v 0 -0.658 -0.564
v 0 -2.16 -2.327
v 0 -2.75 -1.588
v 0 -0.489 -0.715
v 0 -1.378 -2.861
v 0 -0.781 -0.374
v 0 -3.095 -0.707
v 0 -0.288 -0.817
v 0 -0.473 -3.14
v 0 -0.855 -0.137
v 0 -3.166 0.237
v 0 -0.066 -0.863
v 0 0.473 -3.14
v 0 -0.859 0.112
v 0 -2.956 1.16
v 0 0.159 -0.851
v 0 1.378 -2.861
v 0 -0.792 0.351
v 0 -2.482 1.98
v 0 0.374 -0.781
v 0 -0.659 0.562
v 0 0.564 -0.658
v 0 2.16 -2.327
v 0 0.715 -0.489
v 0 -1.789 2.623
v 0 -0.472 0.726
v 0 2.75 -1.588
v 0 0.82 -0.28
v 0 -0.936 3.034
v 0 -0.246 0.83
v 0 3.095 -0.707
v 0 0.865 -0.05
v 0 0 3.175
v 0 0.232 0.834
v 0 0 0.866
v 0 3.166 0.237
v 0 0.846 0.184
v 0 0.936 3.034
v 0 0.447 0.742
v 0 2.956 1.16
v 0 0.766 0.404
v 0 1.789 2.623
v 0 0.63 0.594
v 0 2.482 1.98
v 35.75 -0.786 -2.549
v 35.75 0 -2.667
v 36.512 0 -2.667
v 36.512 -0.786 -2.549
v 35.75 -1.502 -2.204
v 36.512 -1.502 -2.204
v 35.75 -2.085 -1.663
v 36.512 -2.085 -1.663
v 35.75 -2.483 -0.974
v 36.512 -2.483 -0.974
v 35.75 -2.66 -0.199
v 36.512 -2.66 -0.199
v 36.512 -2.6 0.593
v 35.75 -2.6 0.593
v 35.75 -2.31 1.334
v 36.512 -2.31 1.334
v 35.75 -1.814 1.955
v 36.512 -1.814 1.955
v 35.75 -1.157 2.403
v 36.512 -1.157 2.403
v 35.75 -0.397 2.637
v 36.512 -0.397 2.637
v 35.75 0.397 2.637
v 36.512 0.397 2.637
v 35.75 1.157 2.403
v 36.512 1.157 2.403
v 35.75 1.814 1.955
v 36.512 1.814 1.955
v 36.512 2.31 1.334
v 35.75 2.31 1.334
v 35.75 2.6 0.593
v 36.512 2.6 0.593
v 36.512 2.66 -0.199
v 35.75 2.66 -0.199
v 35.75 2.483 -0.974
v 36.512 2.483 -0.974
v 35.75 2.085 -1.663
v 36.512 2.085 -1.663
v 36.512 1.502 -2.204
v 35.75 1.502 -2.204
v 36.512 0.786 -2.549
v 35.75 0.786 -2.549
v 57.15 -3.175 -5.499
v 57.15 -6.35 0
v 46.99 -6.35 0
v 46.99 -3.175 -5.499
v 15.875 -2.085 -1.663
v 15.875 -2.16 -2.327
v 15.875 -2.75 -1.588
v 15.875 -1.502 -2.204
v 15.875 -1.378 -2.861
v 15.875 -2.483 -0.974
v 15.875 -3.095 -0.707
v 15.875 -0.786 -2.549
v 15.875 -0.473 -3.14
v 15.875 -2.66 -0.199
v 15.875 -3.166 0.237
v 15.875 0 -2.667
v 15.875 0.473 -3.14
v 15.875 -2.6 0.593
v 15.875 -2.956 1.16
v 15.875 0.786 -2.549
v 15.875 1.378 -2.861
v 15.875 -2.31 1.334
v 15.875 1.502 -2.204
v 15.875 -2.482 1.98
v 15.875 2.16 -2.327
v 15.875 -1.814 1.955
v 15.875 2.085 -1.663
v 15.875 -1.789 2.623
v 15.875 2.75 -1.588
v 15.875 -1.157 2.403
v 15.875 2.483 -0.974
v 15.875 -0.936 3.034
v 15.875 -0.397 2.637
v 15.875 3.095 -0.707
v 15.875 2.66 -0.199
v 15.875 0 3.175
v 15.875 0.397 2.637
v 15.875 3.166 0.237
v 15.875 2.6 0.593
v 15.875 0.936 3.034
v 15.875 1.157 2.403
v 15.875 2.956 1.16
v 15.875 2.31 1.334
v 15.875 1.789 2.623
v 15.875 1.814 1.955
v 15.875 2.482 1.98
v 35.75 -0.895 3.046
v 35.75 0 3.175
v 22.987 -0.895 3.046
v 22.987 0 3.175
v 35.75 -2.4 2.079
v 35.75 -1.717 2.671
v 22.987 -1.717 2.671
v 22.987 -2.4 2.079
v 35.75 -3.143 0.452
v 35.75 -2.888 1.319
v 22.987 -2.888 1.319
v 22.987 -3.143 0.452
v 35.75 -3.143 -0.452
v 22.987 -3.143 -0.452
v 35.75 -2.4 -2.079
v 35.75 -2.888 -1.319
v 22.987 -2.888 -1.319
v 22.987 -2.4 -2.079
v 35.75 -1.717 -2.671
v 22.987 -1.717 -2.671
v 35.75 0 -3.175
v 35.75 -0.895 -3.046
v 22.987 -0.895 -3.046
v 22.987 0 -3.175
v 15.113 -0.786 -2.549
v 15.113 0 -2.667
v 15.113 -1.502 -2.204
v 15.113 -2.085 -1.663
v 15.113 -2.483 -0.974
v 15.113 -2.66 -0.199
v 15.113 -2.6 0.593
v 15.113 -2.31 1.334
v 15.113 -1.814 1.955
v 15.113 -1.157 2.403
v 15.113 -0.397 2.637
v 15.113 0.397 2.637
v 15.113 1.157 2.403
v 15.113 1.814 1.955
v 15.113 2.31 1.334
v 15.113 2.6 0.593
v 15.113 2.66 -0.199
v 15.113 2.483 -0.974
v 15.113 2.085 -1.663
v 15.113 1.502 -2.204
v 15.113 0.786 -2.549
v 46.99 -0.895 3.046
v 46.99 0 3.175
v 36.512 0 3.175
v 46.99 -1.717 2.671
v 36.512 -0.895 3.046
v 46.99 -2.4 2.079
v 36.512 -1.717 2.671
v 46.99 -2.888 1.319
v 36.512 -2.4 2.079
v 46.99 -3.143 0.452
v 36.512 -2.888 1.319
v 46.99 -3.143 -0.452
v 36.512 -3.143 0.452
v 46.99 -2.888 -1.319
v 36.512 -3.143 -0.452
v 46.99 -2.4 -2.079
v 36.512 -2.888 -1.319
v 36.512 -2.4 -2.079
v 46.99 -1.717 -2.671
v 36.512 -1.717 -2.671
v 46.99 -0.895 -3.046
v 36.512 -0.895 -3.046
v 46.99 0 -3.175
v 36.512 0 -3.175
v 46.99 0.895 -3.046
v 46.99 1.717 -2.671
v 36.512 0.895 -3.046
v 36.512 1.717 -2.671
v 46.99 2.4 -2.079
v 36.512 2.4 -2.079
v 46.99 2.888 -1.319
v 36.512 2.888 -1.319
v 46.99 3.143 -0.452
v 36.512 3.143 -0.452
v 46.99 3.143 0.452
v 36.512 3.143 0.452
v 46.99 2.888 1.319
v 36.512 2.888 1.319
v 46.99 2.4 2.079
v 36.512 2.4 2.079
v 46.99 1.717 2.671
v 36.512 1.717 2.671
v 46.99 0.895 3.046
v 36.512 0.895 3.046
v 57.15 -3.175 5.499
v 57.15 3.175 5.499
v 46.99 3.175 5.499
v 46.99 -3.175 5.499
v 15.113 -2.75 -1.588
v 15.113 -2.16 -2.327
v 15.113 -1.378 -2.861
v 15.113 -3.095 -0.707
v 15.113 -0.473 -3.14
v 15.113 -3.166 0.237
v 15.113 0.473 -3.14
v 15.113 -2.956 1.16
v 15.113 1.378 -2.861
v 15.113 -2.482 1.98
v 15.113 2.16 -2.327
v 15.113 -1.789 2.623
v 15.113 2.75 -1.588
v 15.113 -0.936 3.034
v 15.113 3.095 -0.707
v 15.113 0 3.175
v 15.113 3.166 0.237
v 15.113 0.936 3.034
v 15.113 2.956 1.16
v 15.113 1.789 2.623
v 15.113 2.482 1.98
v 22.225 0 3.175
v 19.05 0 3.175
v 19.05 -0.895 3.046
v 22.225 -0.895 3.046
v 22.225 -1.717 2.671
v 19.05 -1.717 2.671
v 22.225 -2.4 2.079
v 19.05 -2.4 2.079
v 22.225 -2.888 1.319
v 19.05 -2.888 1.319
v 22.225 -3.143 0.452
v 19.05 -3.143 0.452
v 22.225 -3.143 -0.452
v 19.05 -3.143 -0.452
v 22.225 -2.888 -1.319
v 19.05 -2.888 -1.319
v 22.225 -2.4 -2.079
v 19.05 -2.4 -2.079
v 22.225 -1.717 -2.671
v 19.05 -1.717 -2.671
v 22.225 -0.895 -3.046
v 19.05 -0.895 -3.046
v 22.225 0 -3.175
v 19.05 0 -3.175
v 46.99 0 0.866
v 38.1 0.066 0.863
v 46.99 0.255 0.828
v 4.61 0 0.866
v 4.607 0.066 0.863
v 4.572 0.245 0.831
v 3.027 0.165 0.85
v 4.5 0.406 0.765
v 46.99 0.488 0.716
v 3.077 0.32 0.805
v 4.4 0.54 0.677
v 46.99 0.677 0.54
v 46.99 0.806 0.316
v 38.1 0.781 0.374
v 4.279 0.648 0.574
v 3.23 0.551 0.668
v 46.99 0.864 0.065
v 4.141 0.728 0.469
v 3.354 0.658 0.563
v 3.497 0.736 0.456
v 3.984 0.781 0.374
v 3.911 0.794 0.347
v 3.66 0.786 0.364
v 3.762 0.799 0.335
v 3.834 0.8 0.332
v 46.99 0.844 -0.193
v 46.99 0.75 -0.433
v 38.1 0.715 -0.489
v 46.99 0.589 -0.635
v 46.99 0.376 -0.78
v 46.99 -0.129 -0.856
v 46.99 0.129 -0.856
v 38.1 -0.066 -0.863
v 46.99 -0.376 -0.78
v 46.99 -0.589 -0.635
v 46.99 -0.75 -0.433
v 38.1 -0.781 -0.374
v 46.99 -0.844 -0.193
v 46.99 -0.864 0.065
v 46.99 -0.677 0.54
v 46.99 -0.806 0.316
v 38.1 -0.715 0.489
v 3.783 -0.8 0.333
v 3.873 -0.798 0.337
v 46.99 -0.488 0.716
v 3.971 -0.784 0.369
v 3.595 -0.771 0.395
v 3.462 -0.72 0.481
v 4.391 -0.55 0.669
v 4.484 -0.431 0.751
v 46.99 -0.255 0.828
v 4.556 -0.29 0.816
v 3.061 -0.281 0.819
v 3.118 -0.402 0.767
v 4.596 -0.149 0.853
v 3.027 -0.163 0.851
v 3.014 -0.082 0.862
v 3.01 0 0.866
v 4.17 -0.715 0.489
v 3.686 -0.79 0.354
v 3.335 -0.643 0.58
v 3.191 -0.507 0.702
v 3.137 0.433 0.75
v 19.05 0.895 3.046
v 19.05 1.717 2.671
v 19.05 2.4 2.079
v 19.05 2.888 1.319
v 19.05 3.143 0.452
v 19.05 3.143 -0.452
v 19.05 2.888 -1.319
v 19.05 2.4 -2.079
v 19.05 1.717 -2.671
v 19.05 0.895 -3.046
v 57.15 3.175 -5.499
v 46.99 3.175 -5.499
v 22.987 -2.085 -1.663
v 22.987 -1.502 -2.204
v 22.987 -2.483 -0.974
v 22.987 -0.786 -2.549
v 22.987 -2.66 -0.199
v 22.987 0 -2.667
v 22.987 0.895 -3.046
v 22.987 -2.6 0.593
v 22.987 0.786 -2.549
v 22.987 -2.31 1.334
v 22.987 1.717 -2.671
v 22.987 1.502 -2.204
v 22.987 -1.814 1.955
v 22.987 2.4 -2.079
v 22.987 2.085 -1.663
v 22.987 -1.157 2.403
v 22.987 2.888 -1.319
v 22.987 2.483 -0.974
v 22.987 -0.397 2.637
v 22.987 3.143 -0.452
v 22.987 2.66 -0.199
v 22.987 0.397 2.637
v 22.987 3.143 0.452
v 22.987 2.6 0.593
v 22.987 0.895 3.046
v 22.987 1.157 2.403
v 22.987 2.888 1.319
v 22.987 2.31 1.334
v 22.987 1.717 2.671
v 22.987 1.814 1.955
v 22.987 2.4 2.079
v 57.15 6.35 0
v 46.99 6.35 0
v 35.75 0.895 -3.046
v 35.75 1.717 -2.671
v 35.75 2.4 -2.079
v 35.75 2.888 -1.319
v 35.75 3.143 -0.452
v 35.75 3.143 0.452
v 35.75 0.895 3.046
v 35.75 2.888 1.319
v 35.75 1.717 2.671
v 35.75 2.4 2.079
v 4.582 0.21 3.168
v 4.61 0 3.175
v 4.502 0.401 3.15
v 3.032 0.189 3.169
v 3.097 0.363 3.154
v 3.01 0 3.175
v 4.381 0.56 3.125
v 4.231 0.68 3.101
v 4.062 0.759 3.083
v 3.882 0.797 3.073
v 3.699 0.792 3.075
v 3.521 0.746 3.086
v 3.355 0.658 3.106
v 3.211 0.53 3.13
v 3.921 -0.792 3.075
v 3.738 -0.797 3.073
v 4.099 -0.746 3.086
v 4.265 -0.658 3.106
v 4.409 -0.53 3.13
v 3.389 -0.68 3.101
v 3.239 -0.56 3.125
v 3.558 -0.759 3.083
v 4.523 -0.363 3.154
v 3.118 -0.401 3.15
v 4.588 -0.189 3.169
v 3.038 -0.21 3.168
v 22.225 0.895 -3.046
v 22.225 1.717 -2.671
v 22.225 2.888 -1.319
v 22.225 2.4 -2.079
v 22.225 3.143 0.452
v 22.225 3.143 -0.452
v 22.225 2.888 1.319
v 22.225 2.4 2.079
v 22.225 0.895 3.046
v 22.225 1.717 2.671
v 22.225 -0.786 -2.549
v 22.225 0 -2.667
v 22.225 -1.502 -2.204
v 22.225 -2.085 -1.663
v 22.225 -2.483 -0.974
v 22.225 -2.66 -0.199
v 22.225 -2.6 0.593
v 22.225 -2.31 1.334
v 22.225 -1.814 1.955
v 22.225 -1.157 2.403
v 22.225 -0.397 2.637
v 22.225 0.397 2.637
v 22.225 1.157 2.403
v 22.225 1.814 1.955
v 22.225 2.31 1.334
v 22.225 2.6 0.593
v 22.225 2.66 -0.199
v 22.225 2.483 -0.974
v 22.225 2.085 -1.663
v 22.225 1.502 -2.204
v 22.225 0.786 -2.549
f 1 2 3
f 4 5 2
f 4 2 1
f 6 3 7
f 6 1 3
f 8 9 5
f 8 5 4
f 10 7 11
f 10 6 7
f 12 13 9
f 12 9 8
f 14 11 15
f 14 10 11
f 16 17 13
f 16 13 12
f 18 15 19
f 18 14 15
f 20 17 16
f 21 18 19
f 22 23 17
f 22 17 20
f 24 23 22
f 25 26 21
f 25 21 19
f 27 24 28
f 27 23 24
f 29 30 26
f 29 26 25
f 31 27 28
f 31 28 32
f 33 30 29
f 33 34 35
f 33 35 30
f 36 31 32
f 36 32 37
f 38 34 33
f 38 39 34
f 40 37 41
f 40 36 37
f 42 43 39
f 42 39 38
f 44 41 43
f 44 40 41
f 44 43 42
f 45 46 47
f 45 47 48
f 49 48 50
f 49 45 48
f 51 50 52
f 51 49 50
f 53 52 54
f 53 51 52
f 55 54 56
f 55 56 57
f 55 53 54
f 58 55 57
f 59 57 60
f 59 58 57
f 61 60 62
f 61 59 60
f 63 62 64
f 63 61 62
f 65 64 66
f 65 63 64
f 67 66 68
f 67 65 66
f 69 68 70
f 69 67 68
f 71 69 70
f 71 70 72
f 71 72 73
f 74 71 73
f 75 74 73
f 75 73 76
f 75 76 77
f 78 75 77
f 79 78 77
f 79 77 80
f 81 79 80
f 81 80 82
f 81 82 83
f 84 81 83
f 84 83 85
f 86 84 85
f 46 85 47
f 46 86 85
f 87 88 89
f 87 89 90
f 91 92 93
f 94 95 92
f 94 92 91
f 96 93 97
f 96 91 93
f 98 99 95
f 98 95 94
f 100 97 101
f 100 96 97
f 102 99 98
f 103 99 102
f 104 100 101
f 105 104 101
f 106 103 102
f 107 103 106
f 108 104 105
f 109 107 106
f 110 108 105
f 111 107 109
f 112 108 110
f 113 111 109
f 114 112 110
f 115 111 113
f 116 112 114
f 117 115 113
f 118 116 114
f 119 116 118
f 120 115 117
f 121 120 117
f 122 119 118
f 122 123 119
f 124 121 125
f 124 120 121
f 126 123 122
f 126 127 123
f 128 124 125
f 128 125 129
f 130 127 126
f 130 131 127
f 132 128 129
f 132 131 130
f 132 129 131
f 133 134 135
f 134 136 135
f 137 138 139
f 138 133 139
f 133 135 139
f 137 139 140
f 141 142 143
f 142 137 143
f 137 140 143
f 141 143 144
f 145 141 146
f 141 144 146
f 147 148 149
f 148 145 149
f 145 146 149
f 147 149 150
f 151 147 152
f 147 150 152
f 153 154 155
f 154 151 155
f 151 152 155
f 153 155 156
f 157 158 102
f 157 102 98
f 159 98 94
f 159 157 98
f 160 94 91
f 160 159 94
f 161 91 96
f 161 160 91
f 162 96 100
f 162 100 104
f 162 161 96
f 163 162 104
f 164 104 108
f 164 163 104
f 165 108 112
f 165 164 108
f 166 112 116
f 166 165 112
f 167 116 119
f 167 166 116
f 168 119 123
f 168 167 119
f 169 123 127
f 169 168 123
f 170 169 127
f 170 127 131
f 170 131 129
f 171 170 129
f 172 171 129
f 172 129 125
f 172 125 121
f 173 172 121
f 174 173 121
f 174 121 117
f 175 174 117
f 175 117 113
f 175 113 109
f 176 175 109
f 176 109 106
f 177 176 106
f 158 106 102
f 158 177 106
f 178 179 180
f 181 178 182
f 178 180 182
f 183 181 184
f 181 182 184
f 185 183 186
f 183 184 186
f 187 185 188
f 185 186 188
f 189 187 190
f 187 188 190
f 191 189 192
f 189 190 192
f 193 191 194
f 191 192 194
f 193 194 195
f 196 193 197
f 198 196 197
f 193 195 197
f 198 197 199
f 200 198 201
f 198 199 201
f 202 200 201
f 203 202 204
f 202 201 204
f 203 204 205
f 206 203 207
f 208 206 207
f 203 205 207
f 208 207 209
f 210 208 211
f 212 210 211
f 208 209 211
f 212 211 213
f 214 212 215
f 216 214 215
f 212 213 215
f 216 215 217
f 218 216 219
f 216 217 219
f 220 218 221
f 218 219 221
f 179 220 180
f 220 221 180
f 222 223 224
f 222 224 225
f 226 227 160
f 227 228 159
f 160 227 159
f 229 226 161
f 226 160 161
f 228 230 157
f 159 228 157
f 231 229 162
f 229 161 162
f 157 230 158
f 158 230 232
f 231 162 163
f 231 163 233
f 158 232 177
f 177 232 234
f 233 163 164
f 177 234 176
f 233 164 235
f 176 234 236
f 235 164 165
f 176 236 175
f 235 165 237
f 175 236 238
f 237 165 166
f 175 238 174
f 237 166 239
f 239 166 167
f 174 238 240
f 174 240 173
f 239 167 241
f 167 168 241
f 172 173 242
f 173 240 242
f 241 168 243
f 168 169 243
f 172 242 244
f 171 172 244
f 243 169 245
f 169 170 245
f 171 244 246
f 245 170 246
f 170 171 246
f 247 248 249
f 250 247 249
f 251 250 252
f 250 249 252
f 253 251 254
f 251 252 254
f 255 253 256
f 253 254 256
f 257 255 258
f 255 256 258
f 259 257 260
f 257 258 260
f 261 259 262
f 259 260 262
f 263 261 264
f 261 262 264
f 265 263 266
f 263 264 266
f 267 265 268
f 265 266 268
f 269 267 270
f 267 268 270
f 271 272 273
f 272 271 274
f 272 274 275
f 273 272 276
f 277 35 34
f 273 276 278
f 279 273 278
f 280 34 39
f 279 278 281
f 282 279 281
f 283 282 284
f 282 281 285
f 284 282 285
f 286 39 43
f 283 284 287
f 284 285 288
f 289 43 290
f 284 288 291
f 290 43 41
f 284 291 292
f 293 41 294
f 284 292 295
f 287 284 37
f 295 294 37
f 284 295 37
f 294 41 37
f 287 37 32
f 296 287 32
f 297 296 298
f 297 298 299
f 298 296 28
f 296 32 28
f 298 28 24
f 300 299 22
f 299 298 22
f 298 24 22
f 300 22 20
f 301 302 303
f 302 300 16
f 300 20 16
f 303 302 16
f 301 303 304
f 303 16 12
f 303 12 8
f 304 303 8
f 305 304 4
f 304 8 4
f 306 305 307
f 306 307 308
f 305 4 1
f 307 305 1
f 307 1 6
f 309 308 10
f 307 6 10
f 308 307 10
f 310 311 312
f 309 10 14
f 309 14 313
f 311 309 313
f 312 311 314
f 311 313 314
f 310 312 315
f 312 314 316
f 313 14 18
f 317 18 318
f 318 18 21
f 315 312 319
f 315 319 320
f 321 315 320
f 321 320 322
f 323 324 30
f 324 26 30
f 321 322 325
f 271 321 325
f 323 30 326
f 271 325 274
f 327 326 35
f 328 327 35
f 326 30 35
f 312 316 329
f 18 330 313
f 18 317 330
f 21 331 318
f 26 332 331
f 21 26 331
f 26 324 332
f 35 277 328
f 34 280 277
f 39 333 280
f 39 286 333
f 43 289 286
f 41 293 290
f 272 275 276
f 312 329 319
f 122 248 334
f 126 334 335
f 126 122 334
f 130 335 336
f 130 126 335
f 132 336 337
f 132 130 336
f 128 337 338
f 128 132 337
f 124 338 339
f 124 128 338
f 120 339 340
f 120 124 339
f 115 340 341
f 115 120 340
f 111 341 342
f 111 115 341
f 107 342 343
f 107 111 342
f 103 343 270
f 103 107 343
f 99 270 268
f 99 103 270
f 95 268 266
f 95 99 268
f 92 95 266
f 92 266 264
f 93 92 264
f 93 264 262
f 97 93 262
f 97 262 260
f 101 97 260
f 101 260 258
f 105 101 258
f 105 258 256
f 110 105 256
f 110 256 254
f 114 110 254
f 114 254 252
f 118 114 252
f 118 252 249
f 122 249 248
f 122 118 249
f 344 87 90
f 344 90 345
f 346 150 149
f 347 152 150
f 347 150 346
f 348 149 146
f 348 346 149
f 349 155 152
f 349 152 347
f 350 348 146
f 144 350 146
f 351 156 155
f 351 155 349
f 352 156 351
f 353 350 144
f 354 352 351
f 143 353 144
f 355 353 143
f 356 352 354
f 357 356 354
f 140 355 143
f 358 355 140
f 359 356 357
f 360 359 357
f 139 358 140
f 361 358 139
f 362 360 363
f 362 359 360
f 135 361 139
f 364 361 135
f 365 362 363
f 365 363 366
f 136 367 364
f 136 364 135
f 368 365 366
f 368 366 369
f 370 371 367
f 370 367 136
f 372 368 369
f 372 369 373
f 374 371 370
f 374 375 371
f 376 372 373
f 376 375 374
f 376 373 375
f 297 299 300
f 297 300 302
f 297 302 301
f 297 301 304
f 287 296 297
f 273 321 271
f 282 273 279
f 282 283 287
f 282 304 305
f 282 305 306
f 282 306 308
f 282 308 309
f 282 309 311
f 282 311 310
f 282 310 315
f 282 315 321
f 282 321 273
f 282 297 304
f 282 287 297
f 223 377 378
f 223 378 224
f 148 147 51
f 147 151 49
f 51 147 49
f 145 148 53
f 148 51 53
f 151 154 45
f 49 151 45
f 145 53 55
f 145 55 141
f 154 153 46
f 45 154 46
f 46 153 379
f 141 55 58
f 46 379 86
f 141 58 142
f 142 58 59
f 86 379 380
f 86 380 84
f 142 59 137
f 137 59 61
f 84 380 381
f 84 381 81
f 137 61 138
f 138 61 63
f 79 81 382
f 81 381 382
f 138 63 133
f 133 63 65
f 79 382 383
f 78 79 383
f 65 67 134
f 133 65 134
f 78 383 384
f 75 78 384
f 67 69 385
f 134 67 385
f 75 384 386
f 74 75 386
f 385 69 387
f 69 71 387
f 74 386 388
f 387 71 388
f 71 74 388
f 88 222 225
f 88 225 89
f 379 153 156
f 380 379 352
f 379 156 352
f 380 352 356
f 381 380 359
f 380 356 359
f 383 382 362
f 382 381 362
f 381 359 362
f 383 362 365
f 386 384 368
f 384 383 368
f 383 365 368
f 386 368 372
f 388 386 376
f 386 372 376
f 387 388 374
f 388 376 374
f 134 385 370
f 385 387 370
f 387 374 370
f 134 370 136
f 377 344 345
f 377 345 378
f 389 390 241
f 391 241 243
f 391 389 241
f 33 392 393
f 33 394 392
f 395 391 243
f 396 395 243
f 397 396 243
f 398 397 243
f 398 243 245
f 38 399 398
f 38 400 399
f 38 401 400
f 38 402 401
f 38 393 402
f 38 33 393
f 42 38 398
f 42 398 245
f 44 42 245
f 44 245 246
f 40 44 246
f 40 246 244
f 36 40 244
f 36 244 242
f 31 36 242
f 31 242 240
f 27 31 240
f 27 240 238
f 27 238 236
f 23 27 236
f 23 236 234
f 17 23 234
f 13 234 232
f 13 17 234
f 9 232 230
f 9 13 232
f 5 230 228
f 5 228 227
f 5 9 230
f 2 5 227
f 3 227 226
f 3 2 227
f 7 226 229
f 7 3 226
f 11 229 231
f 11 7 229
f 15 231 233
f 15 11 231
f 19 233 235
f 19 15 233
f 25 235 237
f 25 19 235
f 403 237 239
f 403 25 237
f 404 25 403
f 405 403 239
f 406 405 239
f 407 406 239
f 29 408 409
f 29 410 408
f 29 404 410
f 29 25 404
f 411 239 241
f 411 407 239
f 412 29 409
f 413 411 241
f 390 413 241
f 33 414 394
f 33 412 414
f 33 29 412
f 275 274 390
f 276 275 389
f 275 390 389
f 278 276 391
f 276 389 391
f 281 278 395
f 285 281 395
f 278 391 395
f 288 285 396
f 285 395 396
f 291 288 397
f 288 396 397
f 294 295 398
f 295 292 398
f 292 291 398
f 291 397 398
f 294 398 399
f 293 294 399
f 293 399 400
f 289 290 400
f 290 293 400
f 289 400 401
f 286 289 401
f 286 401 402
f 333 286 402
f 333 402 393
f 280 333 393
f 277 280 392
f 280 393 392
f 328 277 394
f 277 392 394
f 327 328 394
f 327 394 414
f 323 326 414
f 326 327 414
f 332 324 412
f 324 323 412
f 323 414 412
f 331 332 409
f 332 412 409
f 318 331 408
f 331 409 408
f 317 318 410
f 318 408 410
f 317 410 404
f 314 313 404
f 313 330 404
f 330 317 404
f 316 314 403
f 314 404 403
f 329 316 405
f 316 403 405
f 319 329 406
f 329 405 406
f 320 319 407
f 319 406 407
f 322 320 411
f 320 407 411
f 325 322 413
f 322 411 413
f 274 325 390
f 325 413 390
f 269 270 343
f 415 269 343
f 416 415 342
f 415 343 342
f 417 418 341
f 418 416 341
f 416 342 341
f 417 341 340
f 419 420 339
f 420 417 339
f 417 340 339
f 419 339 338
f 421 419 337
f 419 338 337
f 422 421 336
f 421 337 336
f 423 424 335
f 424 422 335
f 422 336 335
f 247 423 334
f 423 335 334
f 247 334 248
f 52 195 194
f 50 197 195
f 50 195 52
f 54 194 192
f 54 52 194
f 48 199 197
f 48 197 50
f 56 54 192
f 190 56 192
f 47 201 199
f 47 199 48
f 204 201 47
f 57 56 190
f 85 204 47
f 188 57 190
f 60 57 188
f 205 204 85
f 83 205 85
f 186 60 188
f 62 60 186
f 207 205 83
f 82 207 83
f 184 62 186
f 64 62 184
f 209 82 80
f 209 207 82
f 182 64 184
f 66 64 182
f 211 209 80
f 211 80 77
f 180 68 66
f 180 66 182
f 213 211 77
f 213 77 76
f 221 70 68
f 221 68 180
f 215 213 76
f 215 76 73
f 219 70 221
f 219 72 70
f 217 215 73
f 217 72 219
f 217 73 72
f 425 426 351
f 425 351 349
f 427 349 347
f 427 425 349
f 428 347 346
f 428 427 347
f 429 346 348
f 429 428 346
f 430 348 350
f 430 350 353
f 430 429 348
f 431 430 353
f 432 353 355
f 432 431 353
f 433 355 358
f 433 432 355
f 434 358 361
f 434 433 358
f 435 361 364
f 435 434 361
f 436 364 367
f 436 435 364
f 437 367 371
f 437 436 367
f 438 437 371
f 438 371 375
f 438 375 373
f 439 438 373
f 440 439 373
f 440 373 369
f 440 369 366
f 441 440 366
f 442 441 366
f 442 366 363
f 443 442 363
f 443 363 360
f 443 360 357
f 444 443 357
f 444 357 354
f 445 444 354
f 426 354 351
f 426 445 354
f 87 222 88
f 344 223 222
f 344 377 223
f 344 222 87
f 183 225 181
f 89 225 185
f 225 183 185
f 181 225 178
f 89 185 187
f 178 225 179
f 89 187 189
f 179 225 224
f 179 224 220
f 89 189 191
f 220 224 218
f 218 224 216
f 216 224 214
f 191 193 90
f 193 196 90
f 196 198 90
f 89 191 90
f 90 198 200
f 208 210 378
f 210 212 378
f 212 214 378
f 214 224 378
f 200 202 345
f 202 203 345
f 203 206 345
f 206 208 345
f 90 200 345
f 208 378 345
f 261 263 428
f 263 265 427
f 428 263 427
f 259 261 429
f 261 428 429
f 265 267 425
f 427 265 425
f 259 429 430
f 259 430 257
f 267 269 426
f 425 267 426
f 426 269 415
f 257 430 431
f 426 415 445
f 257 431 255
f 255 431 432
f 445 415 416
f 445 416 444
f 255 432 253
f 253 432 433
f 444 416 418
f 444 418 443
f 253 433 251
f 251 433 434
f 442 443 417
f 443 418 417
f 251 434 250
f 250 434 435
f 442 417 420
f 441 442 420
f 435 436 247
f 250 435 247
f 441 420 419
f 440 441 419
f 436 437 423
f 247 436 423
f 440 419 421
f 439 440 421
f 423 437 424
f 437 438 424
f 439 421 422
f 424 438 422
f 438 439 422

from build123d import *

# Parameters (mm, degrees)
SKETCH1_R           = 3.175
BOSS_EXTRUDE2_DEPTH = 46.99
BOSS_EXTRUDE3_DEPTH = 10.16
SKETCH3_R           = 3.175
SKETCH3_R_2         = 1.778
CUT_EXTRUDE1_DEPTH  = 19.05
SKETCH6_R           = 3.175
BOSS_EXTRUDE5_DEPTH = 49.022
CUT_EXTRUDE5_DEPTH  = 38.1
SKETCH9_R           = 0.866025404
CUT_EXTRUDE7_DEPTH  = 46.99
SKETCH10_R          = 0.8001
CUT_EXTRUDE8_DEPTH  = 5.334
CUT_EXTRUDE9_START  = 0.762
SKETCH11_R          = 3.175
SKETCH11_R_2        = 2.667
CUT_EXTRUDE9_DEPTH  = 0.762
CUT_EXTRUDE10_START = 0.762
SKETCH12_R          = 3.175
SKETCH12_R_2        = 2.667
CUT_EXTRUDE10_DEPTH = 0.762
CUT_EXTRUDE12_START = 0.762
SKETCH13_R          = 3.175
SKETCH13_R_2        = 2.667
CUT_EXTRUDE12_DEPTH = 0.762


with BuildPart() as part:
    # Sketch1 → Boss-Extrude2 (new body)
    with BuildSketch(Plane(origin=(0, 0, 0), x_dir=(0, 0, -1), z_dir=(1, 0, 0))):
        Circle(SKETCH1_R)
    extrude(amount=BOSS_EXTRUDE2_DEPTH)

    # Sketch2 → Boss-Extrude3 (add)
    with BuildSketch(Plane(origin=(46.99, 0, 0), x_dir=(0, 0, -1), z_dir=(1, 0, 0))):
        Polygon((-5.499261314, 3.175), (-5.499261314, -3.175), (0, -6.35), (5.499261314, -3.175), (5.499261314, 3.175), (0, 6.35), align=None)
    extrude(amount=BOSS_EXTRUDE3_DEPTH)

    # Sketch3 → Cut-Extrude1 (cut)
    with BuildSketch(Plane.ZY):
        Circle(SKETCH3_R)
        Circle(SKETCH3_R_2, mode=Mode.SUBTRACT)
    extrude(amount=-CUT_EXTRUDE1_DEPTH, mode=Mode.SUBTRACT)

    # Sketch6 → Boss-Extrude5 (add)
    with BuildSketch(Plane.ZY):
        Circle(SKETCH6_R)
    extrude(amount=-BOSS_EXTRUDE5_DEPTH)

    # Sketch7 → Cut-Extrude5 (cut)
    with BuildSketch(Plane.ZY):
        Polygon((-0.489261374, 0.714579112), (-0.863474351, -0.066423223), (-0.374212977, -0.781002335), (0.489261374, -0.714579112), (0.863474351, 0.066423223), (0.374212977, 0.781002335), align=None)
    extrude(amount=-CUT_EXTRUDE5_DEPTH, mode=Mode.SUBTRACT)

    # Sketch9 → Cut-Extrude7 (cut)
    with BuildSketch(Plane.ZY):
        Circle(SKETCH9_R)
    extrude(amount=-CUT_EXTRUDE7_DEPTH, mode=Mode.SUBTRACT)

    # Sketch10 → Cut-Extrude8 (cut)
    with BuildSketch(Plane.XY.offset(5.499261314)):
        with Locations((3.81, 0)):
            Circle(SKETCH10_R)
    extrude(amount=-CUT_EXTRUDE8_DEPTH, mode=Mode.SUBTRACT)

    # Sketch11 → Cut-Extrude9 (cut)
    with BuildSketch(Plane.ZY.offset(-36.5125).offset(CUT_EXTRUDE9_START)):
        Circle(SKETCH11_R)
        with Locations(Location((0, 0, 0), (0, 0, 180))):
            Circle(SKETCH11_R_2, mode=Mode.SUBTRACT)
    extrude(amount=-CUT_EXTRUDE9_DEPTH, mode=Mode.SUBTRACT)

    # Sketch12 → Cut-Extrude10 (cut)
    with BuildSketch(Plane.ZY.offset(-15.875).offset(CUT_EXTRUDE10_START)):
        Circle(SKETCH12_R)
        with Locations(Location((0, 0, 0), (0, 0, 180))):
            Circle(SKETCH12_R_2, mode=Mode.SUBTRACT)
    extrude(amount=-CUT_EXTRUDE10_DEPTH, mode=Mode.SUBTRACT)

    # Sketch13 → Cut-Extrude12 (cut)
    with BuildSketch(Plane.ZY.offset(-22.987).offset(CUT_EXTRUDE12_START)):
        Circle(SKETCH13_R)
        with Locations(Location((0, 0, 0), (0, 0, 180))):
            Circle(SKETCH13_R_2, mode=Mode.SUBTRACT)
    extrude(amount=-CUT_EXTRUDE12_DEPTH, mode=Mode.SUBTRACT)


solid = part.part
